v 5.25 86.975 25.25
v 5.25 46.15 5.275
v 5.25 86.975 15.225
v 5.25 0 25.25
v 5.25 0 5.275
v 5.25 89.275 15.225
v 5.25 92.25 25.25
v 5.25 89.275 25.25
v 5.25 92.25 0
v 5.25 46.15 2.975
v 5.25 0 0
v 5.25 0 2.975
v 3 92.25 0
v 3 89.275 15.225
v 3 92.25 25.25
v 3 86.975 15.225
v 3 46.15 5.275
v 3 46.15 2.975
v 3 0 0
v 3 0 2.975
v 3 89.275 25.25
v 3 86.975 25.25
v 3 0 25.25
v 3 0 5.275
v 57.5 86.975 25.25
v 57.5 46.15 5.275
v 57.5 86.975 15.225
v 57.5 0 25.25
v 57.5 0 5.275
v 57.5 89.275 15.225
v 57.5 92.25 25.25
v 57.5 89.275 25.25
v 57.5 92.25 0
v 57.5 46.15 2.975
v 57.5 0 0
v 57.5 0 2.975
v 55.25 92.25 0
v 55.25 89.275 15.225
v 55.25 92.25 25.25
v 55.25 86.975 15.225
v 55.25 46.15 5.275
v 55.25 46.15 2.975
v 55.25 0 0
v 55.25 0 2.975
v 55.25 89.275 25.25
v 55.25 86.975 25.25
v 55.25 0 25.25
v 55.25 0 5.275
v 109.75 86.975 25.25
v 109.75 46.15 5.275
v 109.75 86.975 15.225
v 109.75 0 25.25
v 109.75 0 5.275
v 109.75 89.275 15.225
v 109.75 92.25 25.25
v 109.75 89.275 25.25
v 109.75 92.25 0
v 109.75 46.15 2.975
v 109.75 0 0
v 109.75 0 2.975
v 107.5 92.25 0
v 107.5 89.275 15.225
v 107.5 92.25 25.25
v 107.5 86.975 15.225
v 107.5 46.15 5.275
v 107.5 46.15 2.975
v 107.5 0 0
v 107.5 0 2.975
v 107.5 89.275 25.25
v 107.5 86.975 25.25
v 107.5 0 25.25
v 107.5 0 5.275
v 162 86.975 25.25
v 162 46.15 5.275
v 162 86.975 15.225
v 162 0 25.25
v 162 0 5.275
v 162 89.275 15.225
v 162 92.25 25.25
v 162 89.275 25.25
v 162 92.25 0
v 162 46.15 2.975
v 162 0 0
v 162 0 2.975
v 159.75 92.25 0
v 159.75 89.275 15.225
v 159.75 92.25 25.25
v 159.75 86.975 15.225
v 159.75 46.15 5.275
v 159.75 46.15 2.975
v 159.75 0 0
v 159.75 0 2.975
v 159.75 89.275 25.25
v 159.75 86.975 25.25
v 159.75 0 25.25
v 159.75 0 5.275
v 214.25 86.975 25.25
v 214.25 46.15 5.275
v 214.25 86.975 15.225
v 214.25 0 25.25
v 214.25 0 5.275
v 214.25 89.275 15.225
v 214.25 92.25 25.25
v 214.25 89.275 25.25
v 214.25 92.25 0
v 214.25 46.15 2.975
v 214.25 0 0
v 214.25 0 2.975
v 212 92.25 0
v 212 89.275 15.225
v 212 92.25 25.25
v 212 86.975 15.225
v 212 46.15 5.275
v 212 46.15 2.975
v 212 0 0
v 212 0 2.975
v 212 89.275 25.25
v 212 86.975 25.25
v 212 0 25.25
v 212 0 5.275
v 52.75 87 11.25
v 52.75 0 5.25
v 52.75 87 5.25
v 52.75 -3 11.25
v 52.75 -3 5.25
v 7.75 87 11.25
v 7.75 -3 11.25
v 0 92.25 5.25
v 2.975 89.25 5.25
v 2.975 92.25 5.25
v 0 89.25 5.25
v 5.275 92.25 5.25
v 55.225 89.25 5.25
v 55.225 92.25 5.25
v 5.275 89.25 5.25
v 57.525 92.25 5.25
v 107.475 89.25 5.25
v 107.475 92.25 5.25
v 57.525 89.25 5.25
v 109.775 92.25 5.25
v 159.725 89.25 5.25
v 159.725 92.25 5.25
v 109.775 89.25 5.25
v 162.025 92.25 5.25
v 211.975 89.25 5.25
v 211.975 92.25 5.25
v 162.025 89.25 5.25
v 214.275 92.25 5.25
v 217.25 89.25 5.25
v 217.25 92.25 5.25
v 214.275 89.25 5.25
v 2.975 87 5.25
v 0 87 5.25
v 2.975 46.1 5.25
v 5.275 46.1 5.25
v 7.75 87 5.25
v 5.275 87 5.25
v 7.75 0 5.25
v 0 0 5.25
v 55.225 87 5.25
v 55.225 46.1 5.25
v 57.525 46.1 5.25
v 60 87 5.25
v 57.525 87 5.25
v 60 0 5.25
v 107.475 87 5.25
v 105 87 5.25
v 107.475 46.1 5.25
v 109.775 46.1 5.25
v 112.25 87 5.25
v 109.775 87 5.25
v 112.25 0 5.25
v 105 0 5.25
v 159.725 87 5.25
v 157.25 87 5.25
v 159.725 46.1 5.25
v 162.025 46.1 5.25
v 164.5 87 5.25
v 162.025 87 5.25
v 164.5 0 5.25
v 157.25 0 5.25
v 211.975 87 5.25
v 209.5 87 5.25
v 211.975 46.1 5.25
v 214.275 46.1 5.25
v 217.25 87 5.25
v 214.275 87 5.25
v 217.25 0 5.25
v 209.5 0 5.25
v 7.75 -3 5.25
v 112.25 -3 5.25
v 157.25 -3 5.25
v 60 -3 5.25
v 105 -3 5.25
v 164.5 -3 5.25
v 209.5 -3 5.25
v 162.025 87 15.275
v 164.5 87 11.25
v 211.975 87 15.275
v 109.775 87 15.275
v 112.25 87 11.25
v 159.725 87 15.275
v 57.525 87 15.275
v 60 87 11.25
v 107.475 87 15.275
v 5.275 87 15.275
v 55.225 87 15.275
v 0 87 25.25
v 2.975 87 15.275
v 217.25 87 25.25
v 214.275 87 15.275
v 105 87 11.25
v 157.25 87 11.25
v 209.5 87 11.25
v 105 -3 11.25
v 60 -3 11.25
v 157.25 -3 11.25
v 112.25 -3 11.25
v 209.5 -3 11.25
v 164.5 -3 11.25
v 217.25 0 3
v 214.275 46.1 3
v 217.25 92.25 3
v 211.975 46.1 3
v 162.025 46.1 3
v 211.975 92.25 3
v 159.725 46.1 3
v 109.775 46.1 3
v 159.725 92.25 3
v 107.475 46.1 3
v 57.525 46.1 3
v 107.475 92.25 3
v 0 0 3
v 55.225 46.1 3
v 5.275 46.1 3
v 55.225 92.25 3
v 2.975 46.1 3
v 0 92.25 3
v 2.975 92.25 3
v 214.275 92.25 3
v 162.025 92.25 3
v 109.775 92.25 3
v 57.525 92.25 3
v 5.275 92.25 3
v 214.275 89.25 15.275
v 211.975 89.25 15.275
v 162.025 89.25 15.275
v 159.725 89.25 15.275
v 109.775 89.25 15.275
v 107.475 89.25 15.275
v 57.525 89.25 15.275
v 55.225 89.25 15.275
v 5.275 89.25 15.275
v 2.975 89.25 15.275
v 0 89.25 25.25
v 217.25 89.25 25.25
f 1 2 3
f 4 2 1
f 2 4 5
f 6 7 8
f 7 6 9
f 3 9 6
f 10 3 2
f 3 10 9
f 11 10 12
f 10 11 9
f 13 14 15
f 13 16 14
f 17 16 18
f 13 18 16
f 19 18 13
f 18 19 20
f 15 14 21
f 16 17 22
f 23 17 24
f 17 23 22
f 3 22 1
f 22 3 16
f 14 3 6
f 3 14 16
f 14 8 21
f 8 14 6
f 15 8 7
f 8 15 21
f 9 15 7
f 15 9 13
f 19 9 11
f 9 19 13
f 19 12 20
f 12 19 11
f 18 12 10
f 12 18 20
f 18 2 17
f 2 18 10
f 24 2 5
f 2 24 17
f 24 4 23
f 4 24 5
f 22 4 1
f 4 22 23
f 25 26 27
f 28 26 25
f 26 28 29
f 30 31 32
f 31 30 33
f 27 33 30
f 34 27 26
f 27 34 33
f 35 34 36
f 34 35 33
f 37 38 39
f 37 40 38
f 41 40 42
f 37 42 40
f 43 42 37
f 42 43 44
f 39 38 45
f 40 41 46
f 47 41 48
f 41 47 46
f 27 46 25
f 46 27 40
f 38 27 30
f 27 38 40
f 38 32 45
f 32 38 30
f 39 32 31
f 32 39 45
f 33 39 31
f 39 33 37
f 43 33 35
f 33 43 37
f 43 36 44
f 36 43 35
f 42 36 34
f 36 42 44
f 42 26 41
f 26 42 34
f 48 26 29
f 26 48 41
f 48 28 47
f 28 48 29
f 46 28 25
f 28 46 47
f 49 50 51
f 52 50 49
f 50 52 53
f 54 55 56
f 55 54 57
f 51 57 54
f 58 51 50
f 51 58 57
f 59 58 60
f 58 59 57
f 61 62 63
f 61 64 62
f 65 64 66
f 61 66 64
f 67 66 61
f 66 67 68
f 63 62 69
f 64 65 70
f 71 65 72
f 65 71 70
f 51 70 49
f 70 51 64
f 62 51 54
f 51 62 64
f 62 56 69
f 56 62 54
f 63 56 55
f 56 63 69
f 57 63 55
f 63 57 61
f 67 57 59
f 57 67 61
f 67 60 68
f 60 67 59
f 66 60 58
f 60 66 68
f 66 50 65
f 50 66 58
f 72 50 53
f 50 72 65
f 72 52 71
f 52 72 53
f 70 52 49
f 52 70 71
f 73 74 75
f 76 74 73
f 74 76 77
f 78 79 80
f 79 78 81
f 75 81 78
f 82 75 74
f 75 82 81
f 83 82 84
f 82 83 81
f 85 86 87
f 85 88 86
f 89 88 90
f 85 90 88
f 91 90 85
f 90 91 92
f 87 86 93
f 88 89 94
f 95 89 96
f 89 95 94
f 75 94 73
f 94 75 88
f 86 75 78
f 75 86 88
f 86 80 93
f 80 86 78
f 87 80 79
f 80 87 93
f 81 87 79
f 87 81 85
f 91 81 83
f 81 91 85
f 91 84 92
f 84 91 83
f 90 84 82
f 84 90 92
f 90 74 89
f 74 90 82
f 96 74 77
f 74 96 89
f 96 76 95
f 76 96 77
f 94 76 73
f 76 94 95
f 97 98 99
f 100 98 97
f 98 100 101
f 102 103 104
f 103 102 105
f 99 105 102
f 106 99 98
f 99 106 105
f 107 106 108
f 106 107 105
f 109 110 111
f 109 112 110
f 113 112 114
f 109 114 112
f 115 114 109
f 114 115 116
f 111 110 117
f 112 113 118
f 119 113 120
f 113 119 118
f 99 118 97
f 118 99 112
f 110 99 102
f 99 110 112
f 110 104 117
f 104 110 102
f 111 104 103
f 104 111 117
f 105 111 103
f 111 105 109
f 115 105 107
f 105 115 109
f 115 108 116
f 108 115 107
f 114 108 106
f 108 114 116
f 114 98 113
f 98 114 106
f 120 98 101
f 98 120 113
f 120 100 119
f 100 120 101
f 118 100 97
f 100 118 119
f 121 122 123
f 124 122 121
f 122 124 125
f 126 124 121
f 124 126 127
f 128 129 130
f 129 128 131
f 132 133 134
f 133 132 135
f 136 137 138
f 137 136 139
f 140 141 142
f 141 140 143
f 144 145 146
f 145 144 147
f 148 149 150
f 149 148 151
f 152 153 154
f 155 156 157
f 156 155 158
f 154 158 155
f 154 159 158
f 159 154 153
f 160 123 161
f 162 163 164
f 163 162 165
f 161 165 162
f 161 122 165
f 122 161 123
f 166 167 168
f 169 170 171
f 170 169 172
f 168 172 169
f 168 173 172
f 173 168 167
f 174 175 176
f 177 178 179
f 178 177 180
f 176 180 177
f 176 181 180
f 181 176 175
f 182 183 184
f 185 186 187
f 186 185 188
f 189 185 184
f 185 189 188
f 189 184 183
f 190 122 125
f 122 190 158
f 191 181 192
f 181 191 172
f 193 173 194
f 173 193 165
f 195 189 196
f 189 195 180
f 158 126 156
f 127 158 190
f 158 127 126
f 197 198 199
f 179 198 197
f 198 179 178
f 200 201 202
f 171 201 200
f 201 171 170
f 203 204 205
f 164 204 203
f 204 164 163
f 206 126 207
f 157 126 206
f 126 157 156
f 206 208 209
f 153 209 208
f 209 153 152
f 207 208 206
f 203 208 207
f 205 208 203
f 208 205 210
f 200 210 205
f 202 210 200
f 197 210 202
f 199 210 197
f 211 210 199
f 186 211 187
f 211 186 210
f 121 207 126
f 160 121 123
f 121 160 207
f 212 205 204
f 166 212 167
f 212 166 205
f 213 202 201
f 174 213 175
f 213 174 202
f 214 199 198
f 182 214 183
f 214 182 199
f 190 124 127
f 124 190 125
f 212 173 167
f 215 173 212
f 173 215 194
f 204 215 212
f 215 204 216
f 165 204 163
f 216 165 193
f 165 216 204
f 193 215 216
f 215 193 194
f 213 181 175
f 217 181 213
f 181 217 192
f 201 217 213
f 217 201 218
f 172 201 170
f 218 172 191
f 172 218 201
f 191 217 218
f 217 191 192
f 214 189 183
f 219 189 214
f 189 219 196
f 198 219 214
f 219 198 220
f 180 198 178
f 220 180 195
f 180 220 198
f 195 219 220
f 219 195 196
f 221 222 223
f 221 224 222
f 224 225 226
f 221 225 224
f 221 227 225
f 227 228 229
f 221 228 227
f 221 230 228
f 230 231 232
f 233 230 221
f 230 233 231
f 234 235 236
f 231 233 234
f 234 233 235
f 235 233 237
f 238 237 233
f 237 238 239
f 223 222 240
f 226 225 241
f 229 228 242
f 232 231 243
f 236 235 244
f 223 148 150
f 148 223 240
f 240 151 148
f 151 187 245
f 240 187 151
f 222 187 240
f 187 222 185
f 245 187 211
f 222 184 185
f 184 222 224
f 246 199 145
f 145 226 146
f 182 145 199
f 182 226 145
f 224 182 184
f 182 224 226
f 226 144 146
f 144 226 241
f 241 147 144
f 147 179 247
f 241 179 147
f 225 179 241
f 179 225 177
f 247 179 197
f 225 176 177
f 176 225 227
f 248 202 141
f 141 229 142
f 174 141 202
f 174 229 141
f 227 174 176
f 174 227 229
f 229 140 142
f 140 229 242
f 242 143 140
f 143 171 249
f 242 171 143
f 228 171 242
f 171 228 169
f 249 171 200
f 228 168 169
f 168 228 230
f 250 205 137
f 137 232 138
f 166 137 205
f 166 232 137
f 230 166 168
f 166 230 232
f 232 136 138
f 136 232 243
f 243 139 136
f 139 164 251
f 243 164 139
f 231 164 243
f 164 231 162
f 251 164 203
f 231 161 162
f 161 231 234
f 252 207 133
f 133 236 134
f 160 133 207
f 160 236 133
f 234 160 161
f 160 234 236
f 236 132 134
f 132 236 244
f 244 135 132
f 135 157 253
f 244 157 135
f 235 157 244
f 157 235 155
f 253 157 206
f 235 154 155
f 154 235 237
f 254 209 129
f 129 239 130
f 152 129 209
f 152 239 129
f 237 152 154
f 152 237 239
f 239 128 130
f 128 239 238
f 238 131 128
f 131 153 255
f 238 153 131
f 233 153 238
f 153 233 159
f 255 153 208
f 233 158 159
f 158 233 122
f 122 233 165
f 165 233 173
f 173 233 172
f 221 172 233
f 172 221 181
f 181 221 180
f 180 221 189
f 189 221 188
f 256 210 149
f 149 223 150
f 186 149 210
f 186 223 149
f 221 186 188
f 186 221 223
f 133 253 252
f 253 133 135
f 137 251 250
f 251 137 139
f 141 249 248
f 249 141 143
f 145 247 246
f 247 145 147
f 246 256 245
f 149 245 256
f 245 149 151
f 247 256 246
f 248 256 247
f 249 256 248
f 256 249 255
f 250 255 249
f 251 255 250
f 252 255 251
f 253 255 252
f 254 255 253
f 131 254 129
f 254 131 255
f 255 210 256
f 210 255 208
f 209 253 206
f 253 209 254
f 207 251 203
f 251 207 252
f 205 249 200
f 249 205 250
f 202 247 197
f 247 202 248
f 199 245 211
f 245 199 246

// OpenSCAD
// file: functions.scad
// Utility functions by W. Craig Trader are dual-licensed under 
// Creative Commons Attribution-ShareAlike 3.0 Unported License and
// GNU Lesser GPL 3.0 or later.

// ----- Measurements ---------------------------------------------------------

inch = 25.4;            // millimeters in an inch
epsilon = 0.05;		// padding for slots

// ----- Place a part via translation and rotation ----------------------------

module place( translation=[0,0,0], angle=0, hue="" ) {
	for (i = [0 : $children-1]) {
		translate( translation ) 
			rotate( a=angle ) 
				if ( hue != "" ) {
					color( hue ) child(i);
				} else {
					child(i);
				}
	}
}

// ----- Create a straight slot in a piece, with a hairsbreadth of space for fit

module straight_slot( width, height ) {

	translate( [-epsilon/2, -epsilon/2, 0 ] )
		square( [ width+epsilon, height+epsilon ] );
}
// main file
// Power Grid money storage tray 
// Implementation by W. Craig Trader is dual-licensed under 
// Creative Commons Attribution-ShareAlike 3.0 Unported License and
// GNU Lesser GPL 3.0 or later.
//
// From a design by Laura Young.

include <functions.scad>;

// ----- Measurements ---------------------------------------------------------

THICKNESS = 2.25;           // Acrylic thickness for 3/32" acrylic

SECTIONS = 4;

BILL_LENGTH   = 90.0;       // Power Grid money size
BILL_WIDTH    = 45.0;       // Power Grid money size

BILL_HEIGHT   = 20.0;       // Vertical space for money in the tray
BILL_PADDING  = 5.0;        // Padding around the money in the tray
BILL_OVERHANG = 3.0;        // Amount that bills should extend beyond the tray

SIDE_PADDING  = 3.0;        // Padding to left and right of outer dividers
BACK_PADDING  = 3.0;        // Padding to back of back wall
BASE_PADDING  = 3.0;        // Padding under base

// ----- Calculated Dimensions ------------------------------------------------

SECTION_WIDTH = BILL_WIDTH + BILL_PADDING; 
SECTION_DEPTH = BILL_LENGTH - BILL_OVERHANG;

SLOT_WIDTH = THICKNESS;

BASE_LENGTH = SECTIONS * ( SECTION_WIDTH + SLOT_WIDTH ) + SLOT_WIDTH + 2 * SIDE_PADDING;
BASE_HEIGHT = SECTION_DEPTH + SLOT_WIDTH + BACK_PADDING;

DIVIDER_HEIGHT = BASE_HEIGHT;
DIVIDER_LENGTH = BILL_HEIGHT + SLOT_WIDTH + BASE_PADDING;

BACK_LENGTH = BASE_LENGTH;
BACK_HEIGHT = DIVIDER_LENGTH - SLOT_WIDTH - BASE_PADDING;

BASE_SLOT = BASE_HEIGHT / 2;
BACK_SLOT = BACK_HEIGHT / 2;

// ----- Tray Base ------------------------------------------------------------

module tray_base() {
	difference() {
		// base plate
		square( [ BASE_LENGTH, BASE_HEIGHT ] );

		// remove the material for the slots
		for (i=[0:SECTIONS] ) {
			translate( [SIDE_PADDING+i*(SECTION_WIDTH+SLOT_WIDTH),BASE_HEIGHT-BASE_SLOT,0] )
				straight_slot( SLOT_WIDTH, BASE_SLOT );
		}
	}
}

// ----- Tray Back ------------------------------------------------------------

module tray_back() {
	difference() {
		// back plate
		square( [ BACK_LENGTH, BACK_HEIGHT ] );

		// remove the material for the slots
		for (i=[0:SECTIONS] ) {
			translate( [SIDE_PADDING+i*(SECTION_WIDTH+SLOT_WIDTH),0,0] )
				straight_slot( SLOT_WIDTH, BACK_SLOT );
		}
	}
}

// ----- Tray Dividers --------------------------------------------------------

module tray_divider() {
	difference() {
		// divider
		square( [ DIVIDER_LENGTH, DIVIDER_HEIGHT ] );

		// remove the material for the base slot
		translate( [BASE_PADDING,0,0] )
			straight_slot( SLOT_WIDTH, BASE_SLOT );

		// remove the material for the back slot
		translate( [DIVIDER_LENGTH-BACK_SLOT,DIVIDER_HEIGHT-BACK_PADDING-SLOT_WIDTH,0] )
			straight_slot( BACK_SLOT, SLOT_WIDTH );
	}
}

// ----- Assembled View -------------------------------------------------------

module assembled_view() {

	union() {
		color( "Blue" )
		translate([0,0, BASE_PADDING ]) 
			linear_extrude( height=THICKNESS )
				tray_base();

		color( "Green" )
		translate( [0,BASE_HEIGHT-BACK_PADDING,BASE_PADDING+THICKNESS] )
			rotate( a=[+90,0,0] )
				linear_extrude( height=THICKNESS )
					tray_back();

		color( "Red" ) 
		for (i=[0:SECTIONS] ) {
			translate( [SIDE_PADDING+i*(SECTION_WIDTH+SLOT_WIDTH)+SLOT_WIDTH,0,0] )
				rotate( a=[0,-90,0] )
					linear_extrude( height=THICKNESS )
						tray_divider();
		}

		color( "Orange" )
		for (i=[0:SECTIONS-1] ) {
			translate( [SIDE_PADDING+i*(SECTION_WIDTH+SLOT_WIDTH)+SLOT_WIDTH+BILL_PADDING/2,-BILL_OVERHANG,BASE_PADDING+SLOT_WIDTH ] )
				cube( [BILL_WIDTH, BILL_LENGTH, 6 ] );
		}
	}
}

// ----- Cut Parts View -------------------------------------------------------

module cut_parts() {
	spacing = 2.0;

	ax = BASE_LENGTH + spacing;
	ay = BASE_HEIGHT + spacing;

	bx = BACK_LENGTH + spacing;
	by = BACK_HEIGHT + spacing;

	cx = DIVIDER_LENGTH + spacing;
	cy = DIVIDER_HEIGHT + spacing;

	place( [0,0], 0, "Blue" ) tray_base();
	place( [0,ay], 0, "Green" ) tray_back();

	for (i=[0:SECTIONS] ) {
		place( [i*cx, ay+by], 0, "Red" ) tray_divider();
	}

	cut_length = max( ax, (SECTIONS+1)*cx )-spacing;
	cut_height = ay+by+cy-spacing;

	echo( str( "Cut length  = ", cut_length/inch, " in" ) );
	echo( str( "Cut height  = ", cut_height/inch, " in" ) );
}

module dimensions() {
	echo( str( "Assembled length = ", BASE_LENGTH/inch, " in" ) );
	echo( str( "Assembled heigth = ", DIVIDER_LENGTH/inch, " in" ) );
	echo( str( "Assembled depth  = ", BASE_HEIGHT/inch, " in" ) );
}

// ----------------------------------------------------------------------------
// ----- Rendered Parts -------------------------------------------------------
// ----------------------------------------------------------------------------

dimensions();
if ( 1 ) {
	assembled_view();
} else {
	cut_parts();
}
